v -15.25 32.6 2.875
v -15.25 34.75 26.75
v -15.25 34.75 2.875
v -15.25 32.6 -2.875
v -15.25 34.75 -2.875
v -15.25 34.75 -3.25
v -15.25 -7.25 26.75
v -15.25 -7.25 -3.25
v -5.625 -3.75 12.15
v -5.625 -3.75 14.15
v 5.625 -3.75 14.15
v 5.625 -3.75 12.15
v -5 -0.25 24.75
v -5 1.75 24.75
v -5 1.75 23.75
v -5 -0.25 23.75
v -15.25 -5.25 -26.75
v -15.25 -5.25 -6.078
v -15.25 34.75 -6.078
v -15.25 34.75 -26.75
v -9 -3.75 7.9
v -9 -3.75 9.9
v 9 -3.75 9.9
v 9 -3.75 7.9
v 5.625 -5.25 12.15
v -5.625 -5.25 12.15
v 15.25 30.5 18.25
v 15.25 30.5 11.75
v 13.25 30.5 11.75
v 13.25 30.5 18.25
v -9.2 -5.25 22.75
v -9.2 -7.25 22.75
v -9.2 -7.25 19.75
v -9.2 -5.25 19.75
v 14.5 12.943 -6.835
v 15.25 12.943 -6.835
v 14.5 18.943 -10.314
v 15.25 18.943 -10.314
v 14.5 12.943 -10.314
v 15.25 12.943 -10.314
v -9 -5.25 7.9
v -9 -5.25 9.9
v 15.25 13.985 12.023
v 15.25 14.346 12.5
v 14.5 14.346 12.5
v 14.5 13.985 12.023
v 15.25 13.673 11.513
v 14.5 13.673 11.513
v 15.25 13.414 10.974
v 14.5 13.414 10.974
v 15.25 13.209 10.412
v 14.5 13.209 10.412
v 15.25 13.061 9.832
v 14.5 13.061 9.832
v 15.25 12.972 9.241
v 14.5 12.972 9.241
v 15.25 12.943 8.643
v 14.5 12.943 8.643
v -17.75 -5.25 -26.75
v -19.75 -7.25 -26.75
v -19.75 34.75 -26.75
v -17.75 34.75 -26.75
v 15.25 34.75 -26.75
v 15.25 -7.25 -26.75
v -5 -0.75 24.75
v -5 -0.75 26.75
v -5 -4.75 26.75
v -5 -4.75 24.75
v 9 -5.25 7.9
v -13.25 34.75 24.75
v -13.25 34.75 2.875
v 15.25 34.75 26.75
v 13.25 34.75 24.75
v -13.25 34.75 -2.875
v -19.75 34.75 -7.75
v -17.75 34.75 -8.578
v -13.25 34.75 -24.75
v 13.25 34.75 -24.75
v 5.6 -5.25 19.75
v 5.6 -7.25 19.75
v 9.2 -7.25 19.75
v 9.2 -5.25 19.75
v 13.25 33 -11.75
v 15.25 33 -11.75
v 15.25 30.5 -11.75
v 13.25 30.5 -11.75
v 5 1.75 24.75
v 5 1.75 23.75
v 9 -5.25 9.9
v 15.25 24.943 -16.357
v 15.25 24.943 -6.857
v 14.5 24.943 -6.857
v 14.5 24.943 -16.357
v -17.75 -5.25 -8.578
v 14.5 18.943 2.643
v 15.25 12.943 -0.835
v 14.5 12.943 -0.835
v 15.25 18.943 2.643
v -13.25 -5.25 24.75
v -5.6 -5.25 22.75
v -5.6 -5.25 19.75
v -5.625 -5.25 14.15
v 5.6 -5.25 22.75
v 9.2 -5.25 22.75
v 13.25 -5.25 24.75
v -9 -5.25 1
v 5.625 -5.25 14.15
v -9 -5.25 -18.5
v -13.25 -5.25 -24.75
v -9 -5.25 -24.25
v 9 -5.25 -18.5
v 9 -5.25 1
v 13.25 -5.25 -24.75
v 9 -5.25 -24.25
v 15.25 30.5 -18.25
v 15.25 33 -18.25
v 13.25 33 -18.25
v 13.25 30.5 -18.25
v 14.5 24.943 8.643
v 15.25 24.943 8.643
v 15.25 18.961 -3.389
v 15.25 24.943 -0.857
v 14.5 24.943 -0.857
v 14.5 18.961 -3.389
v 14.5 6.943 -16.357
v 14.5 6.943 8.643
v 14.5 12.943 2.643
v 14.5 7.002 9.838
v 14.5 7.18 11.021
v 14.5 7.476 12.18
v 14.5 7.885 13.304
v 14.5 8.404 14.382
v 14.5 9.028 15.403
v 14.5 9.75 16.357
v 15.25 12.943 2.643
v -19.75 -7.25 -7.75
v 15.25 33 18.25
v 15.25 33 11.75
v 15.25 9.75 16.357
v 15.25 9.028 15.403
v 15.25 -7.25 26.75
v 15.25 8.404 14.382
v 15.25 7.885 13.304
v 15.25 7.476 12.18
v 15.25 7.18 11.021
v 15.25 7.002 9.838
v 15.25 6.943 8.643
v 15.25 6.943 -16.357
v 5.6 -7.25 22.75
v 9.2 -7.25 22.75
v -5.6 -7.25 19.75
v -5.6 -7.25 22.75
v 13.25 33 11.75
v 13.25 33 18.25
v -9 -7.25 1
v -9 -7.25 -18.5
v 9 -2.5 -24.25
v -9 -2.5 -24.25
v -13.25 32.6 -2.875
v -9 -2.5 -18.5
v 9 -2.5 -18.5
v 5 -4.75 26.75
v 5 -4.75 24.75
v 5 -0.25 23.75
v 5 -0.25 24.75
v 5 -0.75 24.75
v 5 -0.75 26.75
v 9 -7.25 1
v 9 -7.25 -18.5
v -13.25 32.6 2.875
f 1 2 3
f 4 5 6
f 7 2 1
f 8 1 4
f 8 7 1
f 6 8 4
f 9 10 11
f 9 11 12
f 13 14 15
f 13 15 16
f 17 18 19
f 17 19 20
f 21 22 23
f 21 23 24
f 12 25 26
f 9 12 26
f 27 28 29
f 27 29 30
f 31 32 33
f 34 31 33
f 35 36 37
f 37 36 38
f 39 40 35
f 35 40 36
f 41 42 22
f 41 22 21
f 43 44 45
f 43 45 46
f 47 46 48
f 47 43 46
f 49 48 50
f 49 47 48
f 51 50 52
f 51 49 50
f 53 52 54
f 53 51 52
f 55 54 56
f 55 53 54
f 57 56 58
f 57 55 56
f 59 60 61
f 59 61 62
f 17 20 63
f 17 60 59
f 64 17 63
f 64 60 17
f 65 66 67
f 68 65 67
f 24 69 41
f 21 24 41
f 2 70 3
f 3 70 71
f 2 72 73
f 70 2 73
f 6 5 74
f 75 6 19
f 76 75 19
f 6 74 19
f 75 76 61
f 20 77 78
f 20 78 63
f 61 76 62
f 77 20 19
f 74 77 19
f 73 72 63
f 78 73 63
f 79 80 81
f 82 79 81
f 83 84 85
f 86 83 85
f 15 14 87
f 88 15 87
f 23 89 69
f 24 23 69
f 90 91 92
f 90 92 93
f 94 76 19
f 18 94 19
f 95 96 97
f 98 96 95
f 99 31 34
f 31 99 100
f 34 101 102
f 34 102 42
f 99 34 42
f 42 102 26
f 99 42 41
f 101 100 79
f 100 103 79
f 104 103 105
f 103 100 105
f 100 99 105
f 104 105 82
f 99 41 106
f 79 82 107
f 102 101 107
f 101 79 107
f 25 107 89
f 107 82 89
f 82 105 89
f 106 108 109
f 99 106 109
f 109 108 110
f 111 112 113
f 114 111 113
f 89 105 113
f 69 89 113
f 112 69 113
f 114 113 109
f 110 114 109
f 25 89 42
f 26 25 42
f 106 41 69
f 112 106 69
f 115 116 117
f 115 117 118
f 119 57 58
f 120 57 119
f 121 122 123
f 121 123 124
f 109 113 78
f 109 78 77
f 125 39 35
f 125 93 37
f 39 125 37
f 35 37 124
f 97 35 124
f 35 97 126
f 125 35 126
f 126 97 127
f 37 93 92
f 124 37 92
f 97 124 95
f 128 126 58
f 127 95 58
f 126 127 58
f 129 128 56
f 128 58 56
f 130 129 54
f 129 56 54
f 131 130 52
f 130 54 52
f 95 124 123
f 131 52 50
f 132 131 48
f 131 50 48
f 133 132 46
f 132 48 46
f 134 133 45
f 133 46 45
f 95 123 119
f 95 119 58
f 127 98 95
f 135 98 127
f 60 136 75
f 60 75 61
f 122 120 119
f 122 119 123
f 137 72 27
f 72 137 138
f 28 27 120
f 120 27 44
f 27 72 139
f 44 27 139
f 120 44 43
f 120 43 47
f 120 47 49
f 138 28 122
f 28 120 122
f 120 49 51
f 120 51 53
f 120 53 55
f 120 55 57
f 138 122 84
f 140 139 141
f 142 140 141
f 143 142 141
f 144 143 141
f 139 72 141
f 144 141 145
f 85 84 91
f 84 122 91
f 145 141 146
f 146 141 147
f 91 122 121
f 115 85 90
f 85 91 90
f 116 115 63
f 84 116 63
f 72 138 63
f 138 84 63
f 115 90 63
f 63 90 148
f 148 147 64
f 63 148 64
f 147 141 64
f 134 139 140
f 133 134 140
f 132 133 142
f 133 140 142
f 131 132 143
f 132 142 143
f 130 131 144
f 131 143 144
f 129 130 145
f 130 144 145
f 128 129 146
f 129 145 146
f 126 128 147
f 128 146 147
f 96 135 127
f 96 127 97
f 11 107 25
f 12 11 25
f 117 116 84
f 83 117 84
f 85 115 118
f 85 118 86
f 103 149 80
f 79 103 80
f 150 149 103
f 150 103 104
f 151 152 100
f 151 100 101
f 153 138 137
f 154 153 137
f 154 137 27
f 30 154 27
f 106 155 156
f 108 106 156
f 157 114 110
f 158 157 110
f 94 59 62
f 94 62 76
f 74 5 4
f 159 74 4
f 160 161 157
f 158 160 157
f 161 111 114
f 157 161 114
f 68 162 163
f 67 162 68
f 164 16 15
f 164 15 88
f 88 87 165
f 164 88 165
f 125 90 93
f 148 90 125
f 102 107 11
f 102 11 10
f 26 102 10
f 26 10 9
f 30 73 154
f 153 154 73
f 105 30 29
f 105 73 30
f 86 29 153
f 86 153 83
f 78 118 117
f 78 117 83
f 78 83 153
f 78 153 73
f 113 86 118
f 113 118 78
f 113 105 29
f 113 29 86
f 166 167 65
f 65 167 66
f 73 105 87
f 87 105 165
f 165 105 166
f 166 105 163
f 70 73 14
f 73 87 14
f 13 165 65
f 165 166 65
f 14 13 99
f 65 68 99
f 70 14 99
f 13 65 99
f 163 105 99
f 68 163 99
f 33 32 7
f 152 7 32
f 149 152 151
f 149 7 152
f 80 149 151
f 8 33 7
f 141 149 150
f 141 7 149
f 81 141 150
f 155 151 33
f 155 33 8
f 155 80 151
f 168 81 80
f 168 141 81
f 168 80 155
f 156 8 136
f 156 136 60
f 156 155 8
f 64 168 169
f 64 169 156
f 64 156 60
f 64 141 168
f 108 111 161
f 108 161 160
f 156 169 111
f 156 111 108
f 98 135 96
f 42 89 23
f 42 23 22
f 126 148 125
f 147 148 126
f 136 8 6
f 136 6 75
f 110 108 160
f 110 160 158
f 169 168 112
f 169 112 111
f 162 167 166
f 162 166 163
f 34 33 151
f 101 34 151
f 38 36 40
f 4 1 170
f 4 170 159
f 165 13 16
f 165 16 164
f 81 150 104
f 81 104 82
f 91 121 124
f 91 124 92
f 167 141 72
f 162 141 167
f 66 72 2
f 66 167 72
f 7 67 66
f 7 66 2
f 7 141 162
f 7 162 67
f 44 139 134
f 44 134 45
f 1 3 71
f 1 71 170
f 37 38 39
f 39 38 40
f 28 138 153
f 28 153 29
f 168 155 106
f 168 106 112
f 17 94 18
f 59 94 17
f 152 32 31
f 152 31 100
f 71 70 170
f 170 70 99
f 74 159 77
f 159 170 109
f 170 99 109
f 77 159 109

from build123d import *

# Parameters (mm, degrees)
SKETCH002_W     = 53.5
SKETCH002_H     = 30.5
SKETCH002_W_2   = 19.5
SKETCH002_H_2   = 18
SKETCH002_W_3   = 3
SKETCH002_H_3   = 3.6
PAD001_DEPTH    = 2
SKETCH003_W     = 2
SKETCH003_H     = 11.25
SKETCH003_H_2   = 18
PAD002_DEPTH    = 1.5
SKETCH004_W     = 5.75
SKETCH004_H     = 18
PAD003_DEPTH    = 2.75
SKETCH005_W     = 53.5
SKETCH005_H     = 30.5
SKETCH005_W_2   = 49.5
SKETCH005_H_2   = 26.5
PAD004_DEPTH    = 40
SKETCH006_W     = 10
SKETCH006_H     = 4
POCKET001_DEPTH = 2
SKETCH008_W     = 6.5
SKETCH008_H     = 2.5
POCKET002_DEPTH = 5
SKETCH010_W     = 5.75
SKETCH010_H     = 2.15
POCKET003_DEPTH = 5
POCKET005_DEPTH = 0.75
SKETCH014_W     = 10
SKETCH014_H     = 2
PAD009_DEPTH    = 1
PAD010_DEPTH    = 42
POCKET006_DEPTH = 40


with BuildPart() as part:
    # Sketch002 → Pad001 (new body)
    with BuildSketch(Plane(origin=(0, -7.25, 0), x_dir=(0, 0, -1), z_dir=(0, -1, 0))):
        Rectangle(SKETCH002_W, SKETCH002_H)
        with Locations((8.75, 0)):
            Rectangle(SKETCH002_W_2, SKETCH002_H_2, mode=Mode.SUBTRACT)
        with Locations((-21.25, 7.4)):
            Rectangle(SKETCH002_W_3, SKETCH002_H_3, mode=Mode.SUBTRACT)
        with Locations((-21.25, -7.4)):
            Rectangle(SKETCH002_W_3, SKETCH002_H_3, mode=Mode.SUBTRACT)
    extrude(amount=-PAD001_DEPTH)

    # Sketch003 (on Face18 of Pad001) → Pad002 (join)
    with BuildSketch(Plane(origin=(0, -5.25, 0), x_dir=(0, 0, -1), z_dir=(0, 1, 0))):
        with Locations((-13.15, 0)):
            Rectangle(SKETCH003_W, SKETCH003_H)
        with Locations((-8.9, 0)):
            Rectangle(SKETCH003_W, SKETCH003_H_2)
    extrude(amount=PAD002_DEPTH)

    # Sketch004 (on Face5 of Pad002) → Pad003 (join)
    with BuildSketch(Plane(origin=(0, -5.25, 0), x_dir=(0, 0, -1), z_dir=(0, 1, 0))):
        with Locations((21.375, 0)):
            Rectangle(SKETCH004_W, SKETCH004_H)
    extrude(amount=PAD003_DEPTH)

    # Sketch005 (on Face5 of Pad003) → Pad004 (join)
    with BuildSketch(Plane(origin=(0, -5.25, 0), x_dir=(0, 0, -1), z_dir=(0, 1, 0))):
        Rectangle(SKETCH005_W, SKETCH005_H)
        Rectangle(SKETCH005_W_2, SKETCH005_H_2, mode=Mode.SUBTRACT)
    extrude(amount=PAD004_DEPTH)

    # Sketch006 (on Face34 of Pad004) → Pocket001 (cut)
    with BuildSketch(Plane(origin=(0, -7.25, 26.75), x_dir=(-1, 0, 0), z_dir=(0, 0, 1))):
        with Locations((0, -4.5)):
            Rectangle(SKETCH006_W, SKETCH006_H)
    extrude(amount=-POCKET001_DEPTH, mode=Mode.SUBTRACT)

    # Sketch008 (on Face5 of Pocket001) → Pocket002 (cut)
    with BuildSketch(Plane(origin=(15.25, -7.25, 0), x_dir=(0, 0, 1), z_dir=(1, 0, 0))):
        with Locations((-15, -39)):
            Rectangle(SKETCH008_W, SKETCH008_H)
        with Locations((15, -39)):
            Rectangle(SKETCH008_W, SKETCH008_H)
    extrude(amount=-POCKET002_DEPTH, mode=Mode.SUBTRACT)

    # Sketch010 (on Face3 of Pocket002) → Pocket003 (cut)
    with BuildSketch(Plane(origin=(-15.25, -7.25, 0), x_dir=(0, 0, -1), z_dir=(-1, 0, 0))):
        with Locations((0, -40.925)):
            Rectangle(SKETCH010_W, SKETCH010_H)
    extrude(amount=-POCKET003_DEPTH, mode=Mode.SUBTRACT)

    # Sketch013 (on Face5 of Pocket003) → Pocket005 (cut)
    with BuildSketch(Plane(origin=(15.25, 9.75, -3), x_dir=(0, 0, -1), z_dir=(1, 0, 0))):
        with BuildLine():
            Line((-11.643274, 3.192533), (-11.643274, 15.192533))
            Line((-11.643274, 15.192533), (-2.143274, 15.192533))
            Line((-2.143274, 15.192533), (0.389061, 9.211163))
            Line((0.389061, 9.211163), (3.856726, 15.192533))
            Line((3.856726, 15.192533), (13.356726, 15.192533))
            Line((13.356726, 15.192533), (13.356726, -2.807467))
            Line((13.356726, -2.807467), (-11.643274, -2.807467))
            ThreePointArc((-19.356726, 0), (-15.747516, -2.083778), (-11.643274, -2.807467))
            Line((-19.356726, 0), (-15.5, 4.596267))
            ThreePointArc((-15.5, 4.596267), (-13.695395, 3.554378), (-11.643274, 3.192533))
        make_face()
        Polygon((-5.643274, 9.192533), (-5.643274, 3.192533), (-2.164809, 3.192533), align=None, mode=Mode.SUBTRACT)
        Polygon((7.313657, 9.192533), (7.313657, 3.192533), (3.835191, 3.192533), align=None, mode=Mode.SUBTRACT)
    extrude(amount=-POCKET005_DEPTH, mode=Mode.SUBTRACT)

    # Sketch014 (on Face51 of Pocket005) → Pad009 (join)
    with BuildSketch(Plane(origin=(0, -7.25, 24.75), x_dir=(1, 0, 0), z_dir=(0, 0, -1))):
        with Locations((0, -8)):
            Rectangle(SKETCH014_W, SKETCH014_H)
    extrude(amount=PAD009_DEPTH)

    # Sketch015 (on Face1 of Pad009) → Pad010 (join)
    with BuildSketch(Plane(origin=(0, -7.25, 0), x_dir=(0, 0, -1), z_dir=(0, -1, 0))):
        Polygon((26.75, -15.25), (3.25, -15.25), (7.75, -19.75), (26.75, -19.75), align=None)
    extrude(amount=-PAD010_DEPTH)

    # Sketch016 (on Face78 of Pad010) → Pocket006 (cut)
    with BuildSketch(Plane(origin=(0, 34.75, 0), x_dir=(0, 0, -1), z_dir=(0, 1, 0))):
        Polygon((26.75, 15.25), (26.75, 17.75), (8.578427, 17.75), (6.078427, 15.25), align=None)
    extrude(amount=-POCKET006_DEPTH, mode=Mode.SUBTRACT)


solid = part.part
